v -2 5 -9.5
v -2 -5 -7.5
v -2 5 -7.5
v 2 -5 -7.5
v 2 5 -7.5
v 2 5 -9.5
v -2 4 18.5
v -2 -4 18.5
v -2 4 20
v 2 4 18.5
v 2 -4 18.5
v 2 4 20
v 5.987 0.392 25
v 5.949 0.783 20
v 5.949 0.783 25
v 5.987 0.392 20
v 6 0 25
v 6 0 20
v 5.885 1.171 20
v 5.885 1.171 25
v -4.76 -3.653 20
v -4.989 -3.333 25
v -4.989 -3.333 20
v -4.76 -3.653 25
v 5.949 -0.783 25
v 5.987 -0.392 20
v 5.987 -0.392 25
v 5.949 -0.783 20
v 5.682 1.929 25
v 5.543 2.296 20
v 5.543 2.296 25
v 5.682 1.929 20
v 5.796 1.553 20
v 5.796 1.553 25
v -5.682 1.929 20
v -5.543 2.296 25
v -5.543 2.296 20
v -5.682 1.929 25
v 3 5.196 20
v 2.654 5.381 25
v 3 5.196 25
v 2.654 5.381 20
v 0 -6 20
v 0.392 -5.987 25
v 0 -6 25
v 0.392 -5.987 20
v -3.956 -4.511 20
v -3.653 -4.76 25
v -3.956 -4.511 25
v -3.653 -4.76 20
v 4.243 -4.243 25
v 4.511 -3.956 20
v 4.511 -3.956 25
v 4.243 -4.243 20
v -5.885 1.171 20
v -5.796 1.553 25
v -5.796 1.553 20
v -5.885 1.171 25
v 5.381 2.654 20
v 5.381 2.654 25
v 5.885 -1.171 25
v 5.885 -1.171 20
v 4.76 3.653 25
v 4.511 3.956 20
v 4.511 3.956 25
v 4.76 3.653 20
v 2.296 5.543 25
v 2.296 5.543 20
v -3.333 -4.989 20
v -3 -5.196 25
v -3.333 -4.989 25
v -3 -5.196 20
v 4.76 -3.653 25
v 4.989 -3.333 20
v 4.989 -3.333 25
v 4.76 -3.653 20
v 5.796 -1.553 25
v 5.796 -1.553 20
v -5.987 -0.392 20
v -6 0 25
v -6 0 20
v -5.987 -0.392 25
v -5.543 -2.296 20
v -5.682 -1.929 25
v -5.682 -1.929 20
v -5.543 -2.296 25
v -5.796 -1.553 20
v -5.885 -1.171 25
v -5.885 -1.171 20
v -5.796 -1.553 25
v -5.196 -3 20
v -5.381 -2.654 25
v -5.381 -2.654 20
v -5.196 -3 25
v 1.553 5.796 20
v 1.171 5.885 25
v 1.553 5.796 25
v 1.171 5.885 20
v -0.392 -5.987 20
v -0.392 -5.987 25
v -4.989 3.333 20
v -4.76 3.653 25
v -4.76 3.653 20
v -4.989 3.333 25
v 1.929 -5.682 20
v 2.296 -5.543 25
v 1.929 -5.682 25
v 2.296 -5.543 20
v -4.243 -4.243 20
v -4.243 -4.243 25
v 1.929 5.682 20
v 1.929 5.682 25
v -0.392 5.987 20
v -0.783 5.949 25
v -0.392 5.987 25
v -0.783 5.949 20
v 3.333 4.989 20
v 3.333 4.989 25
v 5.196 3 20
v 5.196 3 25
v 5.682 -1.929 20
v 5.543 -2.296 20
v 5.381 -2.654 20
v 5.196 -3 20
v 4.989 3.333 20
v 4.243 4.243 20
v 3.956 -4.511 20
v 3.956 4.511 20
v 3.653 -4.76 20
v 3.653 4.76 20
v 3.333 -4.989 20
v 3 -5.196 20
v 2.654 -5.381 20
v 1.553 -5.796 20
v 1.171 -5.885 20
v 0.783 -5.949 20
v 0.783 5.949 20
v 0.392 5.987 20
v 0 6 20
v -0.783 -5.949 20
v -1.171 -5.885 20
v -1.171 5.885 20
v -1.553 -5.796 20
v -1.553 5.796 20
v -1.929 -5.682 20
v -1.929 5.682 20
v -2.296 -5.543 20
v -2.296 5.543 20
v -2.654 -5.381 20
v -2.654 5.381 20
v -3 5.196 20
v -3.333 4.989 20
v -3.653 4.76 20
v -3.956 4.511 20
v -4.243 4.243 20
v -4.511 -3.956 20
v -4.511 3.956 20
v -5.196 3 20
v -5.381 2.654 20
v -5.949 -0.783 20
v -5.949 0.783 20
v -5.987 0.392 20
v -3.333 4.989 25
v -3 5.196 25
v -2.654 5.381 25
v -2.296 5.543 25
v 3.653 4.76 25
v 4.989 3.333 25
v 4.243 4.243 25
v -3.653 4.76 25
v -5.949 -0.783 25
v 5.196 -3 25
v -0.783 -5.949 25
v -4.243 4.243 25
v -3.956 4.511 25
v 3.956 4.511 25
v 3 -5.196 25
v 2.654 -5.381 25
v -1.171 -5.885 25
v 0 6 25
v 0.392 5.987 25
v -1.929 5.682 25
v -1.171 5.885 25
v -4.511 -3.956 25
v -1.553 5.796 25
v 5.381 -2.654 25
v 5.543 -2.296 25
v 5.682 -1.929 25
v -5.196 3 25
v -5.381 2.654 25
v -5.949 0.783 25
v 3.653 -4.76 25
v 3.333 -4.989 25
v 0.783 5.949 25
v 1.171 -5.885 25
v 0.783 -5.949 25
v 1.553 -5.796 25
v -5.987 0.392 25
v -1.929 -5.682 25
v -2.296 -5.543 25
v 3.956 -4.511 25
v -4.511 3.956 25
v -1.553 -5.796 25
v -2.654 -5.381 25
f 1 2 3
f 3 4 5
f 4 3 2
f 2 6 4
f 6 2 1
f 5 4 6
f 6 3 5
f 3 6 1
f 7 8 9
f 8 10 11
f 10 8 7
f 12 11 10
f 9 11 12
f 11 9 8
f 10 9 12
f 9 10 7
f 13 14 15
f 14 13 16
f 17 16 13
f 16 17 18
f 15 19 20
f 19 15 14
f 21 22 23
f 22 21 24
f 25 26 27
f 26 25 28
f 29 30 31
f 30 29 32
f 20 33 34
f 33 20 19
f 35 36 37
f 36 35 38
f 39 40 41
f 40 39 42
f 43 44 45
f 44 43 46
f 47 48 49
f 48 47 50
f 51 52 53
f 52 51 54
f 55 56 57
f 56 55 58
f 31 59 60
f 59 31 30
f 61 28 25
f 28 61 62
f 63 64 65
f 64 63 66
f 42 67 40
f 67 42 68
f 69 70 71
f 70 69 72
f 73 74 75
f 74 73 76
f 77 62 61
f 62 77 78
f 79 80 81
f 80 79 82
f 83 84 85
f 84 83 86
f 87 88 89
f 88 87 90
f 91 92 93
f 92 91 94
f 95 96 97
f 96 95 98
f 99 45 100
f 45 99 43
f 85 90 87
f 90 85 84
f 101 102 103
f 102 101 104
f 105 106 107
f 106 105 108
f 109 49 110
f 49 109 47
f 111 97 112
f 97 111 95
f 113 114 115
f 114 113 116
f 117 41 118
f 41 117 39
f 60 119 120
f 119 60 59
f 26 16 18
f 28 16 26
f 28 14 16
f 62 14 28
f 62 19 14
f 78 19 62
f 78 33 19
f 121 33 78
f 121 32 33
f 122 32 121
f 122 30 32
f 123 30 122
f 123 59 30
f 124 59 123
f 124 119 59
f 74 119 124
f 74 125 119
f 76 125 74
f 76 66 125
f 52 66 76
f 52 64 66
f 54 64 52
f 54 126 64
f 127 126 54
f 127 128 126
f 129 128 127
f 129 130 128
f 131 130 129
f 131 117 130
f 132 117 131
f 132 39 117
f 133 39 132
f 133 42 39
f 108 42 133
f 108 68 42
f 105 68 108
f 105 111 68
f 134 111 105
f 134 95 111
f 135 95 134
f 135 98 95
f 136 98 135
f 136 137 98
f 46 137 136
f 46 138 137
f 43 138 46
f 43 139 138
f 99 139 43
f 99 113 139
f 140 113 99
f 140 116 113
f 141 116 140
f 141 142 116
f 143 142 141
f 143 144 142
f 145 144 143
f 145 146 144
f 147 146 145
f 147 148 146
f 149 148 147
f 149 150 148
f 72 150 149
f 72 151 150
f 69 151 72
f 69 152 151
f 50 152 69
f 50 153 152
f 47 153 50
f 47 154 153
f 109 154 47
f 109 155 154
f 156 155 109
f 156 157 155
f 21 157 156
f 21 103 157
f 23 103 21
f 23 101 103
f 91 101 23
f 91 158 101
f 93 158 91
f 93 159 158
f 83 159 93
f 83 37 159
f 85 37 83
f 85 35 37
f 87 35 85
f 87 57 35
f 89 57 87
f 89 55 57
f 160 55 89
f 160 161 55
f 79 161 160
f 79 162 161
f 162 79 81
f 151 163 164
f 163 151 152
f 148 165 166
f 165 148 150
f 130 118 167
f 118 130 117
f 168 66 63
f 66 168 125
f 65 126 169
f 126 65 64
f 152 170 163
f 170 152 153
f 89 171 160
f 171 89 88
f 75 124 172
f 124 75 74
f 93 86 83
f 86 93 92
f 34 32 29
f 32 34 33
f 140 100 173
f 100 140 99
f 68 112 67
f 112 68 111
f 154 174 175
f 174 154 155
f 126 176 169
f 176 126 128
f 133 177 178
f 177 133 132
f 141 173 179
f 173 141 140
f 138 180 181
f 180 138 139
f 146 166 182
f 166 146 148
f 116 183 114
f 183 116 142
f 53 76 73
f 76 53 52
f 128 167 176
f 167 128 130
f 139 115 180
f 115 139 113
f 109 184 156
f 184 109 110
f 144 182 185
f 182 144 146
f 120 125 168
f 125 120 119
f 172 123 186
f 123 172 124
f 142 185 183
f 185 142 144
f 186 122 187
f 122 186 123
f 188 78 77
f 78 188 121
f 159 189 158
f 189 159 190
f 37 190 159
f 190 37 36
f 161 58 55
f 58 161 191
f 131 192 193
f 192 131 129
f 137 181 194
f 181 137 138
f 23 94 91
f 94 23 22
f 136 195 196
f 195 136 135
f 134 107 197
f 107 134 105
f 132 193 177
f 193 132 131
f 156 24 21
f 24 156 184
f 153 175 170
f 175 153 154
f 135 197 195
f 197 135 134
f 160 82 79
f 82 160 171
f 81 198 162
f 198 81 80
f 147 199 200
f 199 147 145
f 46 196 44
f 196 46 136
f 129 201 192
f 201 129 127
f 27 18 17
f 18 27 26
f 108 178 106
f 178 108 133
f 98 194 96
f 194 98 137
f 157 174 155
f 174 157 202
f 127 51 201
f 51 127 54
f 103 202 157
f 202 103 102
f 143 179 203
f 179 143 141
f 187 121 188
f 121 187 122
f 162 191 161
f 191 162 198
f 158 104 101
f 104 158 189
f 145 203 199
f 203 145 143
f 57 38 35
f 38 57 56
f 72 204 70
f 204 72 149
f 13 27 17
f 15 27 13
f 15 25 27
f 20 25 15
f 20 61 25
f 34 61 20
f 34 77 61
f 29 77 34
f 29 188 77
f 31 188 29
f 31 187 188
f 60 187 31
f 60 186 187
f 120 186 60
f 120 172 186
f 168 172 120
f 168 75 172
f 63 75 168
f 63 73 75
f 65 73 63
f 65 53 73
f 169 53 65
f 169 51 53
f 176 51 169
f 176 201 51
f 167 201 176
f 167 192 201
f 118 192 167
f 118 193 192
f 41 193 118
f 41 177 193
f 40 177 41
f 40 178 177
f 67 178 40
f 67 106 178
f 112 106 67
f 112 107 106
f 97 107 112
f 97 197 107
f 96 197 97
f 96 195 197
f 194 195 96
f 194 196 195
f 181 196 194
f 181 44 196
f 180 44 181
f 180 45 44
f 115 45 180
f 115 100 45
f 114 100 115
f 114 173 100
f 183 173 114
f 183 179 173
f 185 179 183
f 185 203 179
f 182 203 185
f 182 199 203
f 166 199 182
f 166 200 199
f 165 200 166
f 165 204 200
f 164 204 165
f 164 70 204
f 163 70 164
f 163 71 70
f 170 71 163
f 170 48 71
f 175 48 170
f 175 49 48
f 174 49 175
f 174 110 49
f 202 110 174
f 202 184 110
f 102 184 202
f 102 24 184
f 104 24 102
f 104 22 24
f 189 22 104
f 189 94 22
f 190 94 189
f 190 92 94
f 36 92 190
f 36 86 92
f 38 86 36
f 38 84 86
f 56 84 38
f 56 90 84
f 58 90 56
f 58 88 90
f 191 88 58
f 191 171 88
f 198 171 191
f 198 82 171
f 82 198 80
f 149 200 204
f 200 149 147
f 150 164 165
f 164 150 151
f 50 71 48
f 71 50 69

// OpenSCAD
// Hose-barb reducer: 8 mm ID -> 5 mm ID
// Print orientation: standing upright along +Z

$fn = 96;

// ---- Dimensions (mm) ----
id1      = 8;     // 8 mm tubing inner diameter
id2      = 5;     // 5 mm tubing inner diameter
bore     = 3;     // through-bore diameter
barb_h1  = 10;    // 8 mm tubing barb height
barb_od1 = 7.5;   // 8 mm tubing barb outer diameter (bottom)
barb_od2 = 9.5;   // 8 mm tubing barb outer diameter (top)
collar_d = 12;    // collar diameter
collar_h = 5;     // collar height
barb_h2  = 8;     // 5 mm tubing barb height
barb_od3 = 6.5;   // 5 mm tubing barb outer diameter (bottom)
barb_od4 = 5.0;   // 5 mm tubing barb outer diameter (top)
z0       = 0;     // start of 8 mm barbs
z1       = 20;    // start of collar
z2       = 25;    // start of 5 mm barbs
z3       = 41;    // end of 5 mm barbs

eps = 0.5;        // cutter overshoot

// ---- Model ----
difference() {
    union() {
        // 8 mm tubing barbs (sawtooth profile)
        for (s = [-1, 1])
            translate([0, 0, z0])
                rotate([0, 90, 0])
                    linear_extrude(height = bore + 2 * eps, center = true)
                        polygon(points = [
                            [barb_od1, -barb_h1 / 2],
                            [barb_od2,  barb_h1 / 2],
                            [barb_od1,  barb_h1 / 2]
                        ]);
        // collar
        translate([0, 0, z1])
            cylinder(d = collar_d, h = collar_h);
        // 5 mm tubing barbs (shrinking profile)
        for (s = [-1, 1])
            translate([0, 0, z2])
                rotate([0, 90, 0])
                    linear_extrude(height = bore + 2 * eps, center = true)
                        polygon(points = [
                            [barb_od3, -barb_h2 / 2],
                            [barb_od4,  barb_h2 / 2],
                            [barb_od3,  barb_h2 / 2]
                        ]);
    }
    // through-bore
    translate([0, 0, z0 - eps])
        rotate([0, 90, 0])
            linear_extrude(height = z3 - z0 + 2 * eps, center = true)
                circle(d = bore);
}
